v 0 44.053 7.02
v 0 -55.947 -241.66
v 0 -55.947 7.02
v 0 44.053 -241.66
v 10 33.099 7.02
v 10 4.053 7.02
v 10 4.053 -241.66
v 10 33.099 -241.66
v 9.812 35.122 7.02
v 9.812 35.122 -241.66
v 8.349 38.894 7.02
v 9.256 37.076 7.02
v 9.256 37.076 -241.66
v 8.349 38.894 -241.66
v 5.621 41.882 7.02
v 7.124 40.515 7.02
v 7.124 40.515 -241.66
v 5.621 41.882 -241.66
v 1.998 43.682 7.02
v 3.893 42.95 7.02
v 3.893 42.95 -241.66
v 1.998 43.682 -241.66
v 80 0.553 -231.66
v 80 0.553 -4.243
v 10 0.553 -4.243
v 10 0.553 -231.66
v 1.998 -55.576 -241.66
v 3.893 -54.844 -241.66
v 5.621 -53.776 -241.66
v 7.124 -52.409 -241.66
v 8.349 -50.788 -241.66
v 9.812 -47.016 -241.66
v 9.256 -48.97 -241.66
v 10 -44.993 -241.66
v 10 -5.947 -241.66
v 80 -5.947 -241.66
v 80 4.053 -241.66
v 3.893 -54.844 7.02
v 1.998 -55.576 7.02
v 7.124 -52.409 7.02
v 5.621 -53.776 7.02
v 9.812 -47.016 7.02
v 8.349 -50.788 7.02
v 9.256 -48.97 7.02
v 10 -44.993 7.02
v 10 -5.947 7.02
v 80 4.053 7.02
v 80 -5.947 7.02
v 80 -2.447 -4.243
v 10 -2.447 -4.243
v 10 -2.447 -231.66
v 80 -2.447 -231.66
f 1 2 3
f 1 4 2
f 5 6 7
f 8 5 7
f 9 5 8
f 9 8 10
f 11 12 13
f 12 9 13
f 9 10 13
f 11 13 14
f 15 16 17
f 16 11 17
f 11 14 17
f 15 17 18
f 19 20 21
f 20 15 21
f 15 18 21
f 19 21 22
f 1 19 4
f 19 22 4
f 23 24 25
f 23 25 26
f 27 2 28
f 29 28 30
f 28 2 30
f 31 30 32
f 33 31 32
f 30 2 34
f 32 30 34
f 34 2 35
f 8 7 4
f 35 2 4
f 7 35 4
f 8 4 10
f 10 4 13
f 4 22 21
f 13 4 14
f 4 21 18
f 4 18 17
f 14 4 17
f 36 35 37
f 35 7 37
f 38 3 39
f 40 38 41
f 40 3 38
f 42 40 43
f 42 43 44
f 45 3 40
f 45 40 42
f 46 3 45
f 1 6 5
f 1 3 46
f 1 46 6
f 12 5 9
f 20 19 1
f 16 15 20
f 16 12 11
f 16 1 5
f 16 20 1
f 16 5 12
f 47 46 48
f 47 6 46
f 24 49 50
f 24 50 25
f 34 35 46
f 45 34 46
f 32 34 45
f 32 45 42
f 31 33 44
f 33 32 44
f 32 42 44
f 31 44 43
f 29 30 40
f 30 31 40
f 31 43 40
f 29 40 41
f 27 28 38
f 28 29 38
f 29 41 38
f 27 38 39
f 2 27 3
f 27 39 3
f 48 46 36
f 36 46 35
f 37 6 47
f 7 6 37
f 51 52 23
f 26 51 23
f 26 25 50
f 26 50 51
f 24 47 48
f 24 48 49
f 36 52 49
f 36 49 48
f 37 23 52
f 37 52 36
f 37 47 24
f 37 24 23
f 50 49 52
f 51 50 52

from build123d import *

# Parameters (mm, degrees)
SKETCH1_W           = 248.68
SKETCH1_H           = 10
BOSS_EXTRUDE1_DEPTH = 80
SKETCH3_W           = 10
SKETCH3_H           = 248.68
BOSS_EXTRUDE2_DEPTH = 40
SKETCH5_W           = 10
SKETCH5_H           = 248.68
BOSS_EXTRUDE3_DEPTH = 50
FILLET1_R           = 11
FILLET2_R           = 11
SKETCH6_W           = 227.416539417
SKETCH6_H           = 3
CUT_EXTRUDE2_DEPTH  = 70


with BuildPart() as part:
    # Sketch1 → Boss-Extrude1 (new body)
    with BuildSketch(Plane(origin=(0, 0, 0), x_dir=(0, 0, -1), z_dir=(1, 0, 0))):
        with Locations((117.31979798, -0.946969697)):
            Rectangle(SKETCH1_W, SKETCH1_H)
    extrude(amount=BOSS_EXTRUDE1_DEPTH)

    # Sketch3 → Boss-Extrude2 (add)
    with BuildSketch(Plane(origin=(0, 4.053030303, 0), x_dir=(1, 0, 0), z_dir=(0, 1, 0))):
        with Locations((5, 117.31979798)):
            Rectangle(SKETCH3_W, SKETCH3_H)
    extrude(amount=BOSS_EXTRUDE2_DEPTH)

    # Sketch5 → Boss-Extrude3 (add)
    with BuildSketch(Plane.XZ.offset(5.946969697)):
        with Locations((5, -117.31979798)):
            Rectangle(SKETCH5_W, SKETCH5_H)
    extrude(amount=BOSS_EXTRUDE3_DEPTH)

    # Fillet1
    # the kernel refuses this fillet: 11 mm, written as the material it takes off along each edge
    with BuildSketch(Plane(origin=(10, 44.053030303, -269.045925855), x_dir=(-1, 0, 0), z_dir=(0, 0, 1))) as fillet1_piece_1:
        with BuildLine():
            CenterArc((11, 10.95445115), FILLET1_R, 180, 84.78409143)
            Line((0, 10.95445115), (-0.22, 10.95445115))
            Line((-0.22, 10.95445115), (-0.22, 0))
            Line((-0.22, 0), (0, -0.22))
            ThreePointArc((0, -0.22), (5, -0.22), (9.98, -0.219089023))
            Line((9.98, -0.219089023), (10, 0))
        make_face()
    extrude(amount=303.452255751, mode=Mode.SUBTRACT)

    # Fillet2
    # the kernel refuses this fillet: 11 mm, written as the material it takes off along each edge
    with BuildSketch(Plane(origin=(10, -55.946969697, 34.406329895), x_dir=(-1, 0, 0), z_dir=(0, 0, -1))) as fillet2_piece_1:
        with BuildLine():
            CenterArc((11, 10.95445115), FILLET2_R, 180, 84.78409143)
            Line((0, 10.95445115), (-0.22, 10.95445115))
            Line((-0.22, 10.95445115), (-0.22, 0))
            Line((-0.22, 0), (0, -0.22))
            ThreePointArc((0, -0.22), (5, -0.22), (9.98, -0.219089023))
            Line((9.98, -0.219089023), (10, 0))
        make_face()
    extrude(amount=303.452255751, mode=Mode.SUBTRACT)

    # Sketch6 → Cut-Extrude2 (cut)
    with BuildSketch(Plane(origin=(80, 0, 0), x_dir=(0, 0, -1), z_dir=(1, 0, 0))):
        with Locations((117.951528272, -0.946969697)):
            Rectangle(SKETCH6_W, SKETCH6_H)
    extrude(amount=-CUT_EXTRUDE2_DEPTH, mode=Mode.SUBTRACT)


solid = part.part
